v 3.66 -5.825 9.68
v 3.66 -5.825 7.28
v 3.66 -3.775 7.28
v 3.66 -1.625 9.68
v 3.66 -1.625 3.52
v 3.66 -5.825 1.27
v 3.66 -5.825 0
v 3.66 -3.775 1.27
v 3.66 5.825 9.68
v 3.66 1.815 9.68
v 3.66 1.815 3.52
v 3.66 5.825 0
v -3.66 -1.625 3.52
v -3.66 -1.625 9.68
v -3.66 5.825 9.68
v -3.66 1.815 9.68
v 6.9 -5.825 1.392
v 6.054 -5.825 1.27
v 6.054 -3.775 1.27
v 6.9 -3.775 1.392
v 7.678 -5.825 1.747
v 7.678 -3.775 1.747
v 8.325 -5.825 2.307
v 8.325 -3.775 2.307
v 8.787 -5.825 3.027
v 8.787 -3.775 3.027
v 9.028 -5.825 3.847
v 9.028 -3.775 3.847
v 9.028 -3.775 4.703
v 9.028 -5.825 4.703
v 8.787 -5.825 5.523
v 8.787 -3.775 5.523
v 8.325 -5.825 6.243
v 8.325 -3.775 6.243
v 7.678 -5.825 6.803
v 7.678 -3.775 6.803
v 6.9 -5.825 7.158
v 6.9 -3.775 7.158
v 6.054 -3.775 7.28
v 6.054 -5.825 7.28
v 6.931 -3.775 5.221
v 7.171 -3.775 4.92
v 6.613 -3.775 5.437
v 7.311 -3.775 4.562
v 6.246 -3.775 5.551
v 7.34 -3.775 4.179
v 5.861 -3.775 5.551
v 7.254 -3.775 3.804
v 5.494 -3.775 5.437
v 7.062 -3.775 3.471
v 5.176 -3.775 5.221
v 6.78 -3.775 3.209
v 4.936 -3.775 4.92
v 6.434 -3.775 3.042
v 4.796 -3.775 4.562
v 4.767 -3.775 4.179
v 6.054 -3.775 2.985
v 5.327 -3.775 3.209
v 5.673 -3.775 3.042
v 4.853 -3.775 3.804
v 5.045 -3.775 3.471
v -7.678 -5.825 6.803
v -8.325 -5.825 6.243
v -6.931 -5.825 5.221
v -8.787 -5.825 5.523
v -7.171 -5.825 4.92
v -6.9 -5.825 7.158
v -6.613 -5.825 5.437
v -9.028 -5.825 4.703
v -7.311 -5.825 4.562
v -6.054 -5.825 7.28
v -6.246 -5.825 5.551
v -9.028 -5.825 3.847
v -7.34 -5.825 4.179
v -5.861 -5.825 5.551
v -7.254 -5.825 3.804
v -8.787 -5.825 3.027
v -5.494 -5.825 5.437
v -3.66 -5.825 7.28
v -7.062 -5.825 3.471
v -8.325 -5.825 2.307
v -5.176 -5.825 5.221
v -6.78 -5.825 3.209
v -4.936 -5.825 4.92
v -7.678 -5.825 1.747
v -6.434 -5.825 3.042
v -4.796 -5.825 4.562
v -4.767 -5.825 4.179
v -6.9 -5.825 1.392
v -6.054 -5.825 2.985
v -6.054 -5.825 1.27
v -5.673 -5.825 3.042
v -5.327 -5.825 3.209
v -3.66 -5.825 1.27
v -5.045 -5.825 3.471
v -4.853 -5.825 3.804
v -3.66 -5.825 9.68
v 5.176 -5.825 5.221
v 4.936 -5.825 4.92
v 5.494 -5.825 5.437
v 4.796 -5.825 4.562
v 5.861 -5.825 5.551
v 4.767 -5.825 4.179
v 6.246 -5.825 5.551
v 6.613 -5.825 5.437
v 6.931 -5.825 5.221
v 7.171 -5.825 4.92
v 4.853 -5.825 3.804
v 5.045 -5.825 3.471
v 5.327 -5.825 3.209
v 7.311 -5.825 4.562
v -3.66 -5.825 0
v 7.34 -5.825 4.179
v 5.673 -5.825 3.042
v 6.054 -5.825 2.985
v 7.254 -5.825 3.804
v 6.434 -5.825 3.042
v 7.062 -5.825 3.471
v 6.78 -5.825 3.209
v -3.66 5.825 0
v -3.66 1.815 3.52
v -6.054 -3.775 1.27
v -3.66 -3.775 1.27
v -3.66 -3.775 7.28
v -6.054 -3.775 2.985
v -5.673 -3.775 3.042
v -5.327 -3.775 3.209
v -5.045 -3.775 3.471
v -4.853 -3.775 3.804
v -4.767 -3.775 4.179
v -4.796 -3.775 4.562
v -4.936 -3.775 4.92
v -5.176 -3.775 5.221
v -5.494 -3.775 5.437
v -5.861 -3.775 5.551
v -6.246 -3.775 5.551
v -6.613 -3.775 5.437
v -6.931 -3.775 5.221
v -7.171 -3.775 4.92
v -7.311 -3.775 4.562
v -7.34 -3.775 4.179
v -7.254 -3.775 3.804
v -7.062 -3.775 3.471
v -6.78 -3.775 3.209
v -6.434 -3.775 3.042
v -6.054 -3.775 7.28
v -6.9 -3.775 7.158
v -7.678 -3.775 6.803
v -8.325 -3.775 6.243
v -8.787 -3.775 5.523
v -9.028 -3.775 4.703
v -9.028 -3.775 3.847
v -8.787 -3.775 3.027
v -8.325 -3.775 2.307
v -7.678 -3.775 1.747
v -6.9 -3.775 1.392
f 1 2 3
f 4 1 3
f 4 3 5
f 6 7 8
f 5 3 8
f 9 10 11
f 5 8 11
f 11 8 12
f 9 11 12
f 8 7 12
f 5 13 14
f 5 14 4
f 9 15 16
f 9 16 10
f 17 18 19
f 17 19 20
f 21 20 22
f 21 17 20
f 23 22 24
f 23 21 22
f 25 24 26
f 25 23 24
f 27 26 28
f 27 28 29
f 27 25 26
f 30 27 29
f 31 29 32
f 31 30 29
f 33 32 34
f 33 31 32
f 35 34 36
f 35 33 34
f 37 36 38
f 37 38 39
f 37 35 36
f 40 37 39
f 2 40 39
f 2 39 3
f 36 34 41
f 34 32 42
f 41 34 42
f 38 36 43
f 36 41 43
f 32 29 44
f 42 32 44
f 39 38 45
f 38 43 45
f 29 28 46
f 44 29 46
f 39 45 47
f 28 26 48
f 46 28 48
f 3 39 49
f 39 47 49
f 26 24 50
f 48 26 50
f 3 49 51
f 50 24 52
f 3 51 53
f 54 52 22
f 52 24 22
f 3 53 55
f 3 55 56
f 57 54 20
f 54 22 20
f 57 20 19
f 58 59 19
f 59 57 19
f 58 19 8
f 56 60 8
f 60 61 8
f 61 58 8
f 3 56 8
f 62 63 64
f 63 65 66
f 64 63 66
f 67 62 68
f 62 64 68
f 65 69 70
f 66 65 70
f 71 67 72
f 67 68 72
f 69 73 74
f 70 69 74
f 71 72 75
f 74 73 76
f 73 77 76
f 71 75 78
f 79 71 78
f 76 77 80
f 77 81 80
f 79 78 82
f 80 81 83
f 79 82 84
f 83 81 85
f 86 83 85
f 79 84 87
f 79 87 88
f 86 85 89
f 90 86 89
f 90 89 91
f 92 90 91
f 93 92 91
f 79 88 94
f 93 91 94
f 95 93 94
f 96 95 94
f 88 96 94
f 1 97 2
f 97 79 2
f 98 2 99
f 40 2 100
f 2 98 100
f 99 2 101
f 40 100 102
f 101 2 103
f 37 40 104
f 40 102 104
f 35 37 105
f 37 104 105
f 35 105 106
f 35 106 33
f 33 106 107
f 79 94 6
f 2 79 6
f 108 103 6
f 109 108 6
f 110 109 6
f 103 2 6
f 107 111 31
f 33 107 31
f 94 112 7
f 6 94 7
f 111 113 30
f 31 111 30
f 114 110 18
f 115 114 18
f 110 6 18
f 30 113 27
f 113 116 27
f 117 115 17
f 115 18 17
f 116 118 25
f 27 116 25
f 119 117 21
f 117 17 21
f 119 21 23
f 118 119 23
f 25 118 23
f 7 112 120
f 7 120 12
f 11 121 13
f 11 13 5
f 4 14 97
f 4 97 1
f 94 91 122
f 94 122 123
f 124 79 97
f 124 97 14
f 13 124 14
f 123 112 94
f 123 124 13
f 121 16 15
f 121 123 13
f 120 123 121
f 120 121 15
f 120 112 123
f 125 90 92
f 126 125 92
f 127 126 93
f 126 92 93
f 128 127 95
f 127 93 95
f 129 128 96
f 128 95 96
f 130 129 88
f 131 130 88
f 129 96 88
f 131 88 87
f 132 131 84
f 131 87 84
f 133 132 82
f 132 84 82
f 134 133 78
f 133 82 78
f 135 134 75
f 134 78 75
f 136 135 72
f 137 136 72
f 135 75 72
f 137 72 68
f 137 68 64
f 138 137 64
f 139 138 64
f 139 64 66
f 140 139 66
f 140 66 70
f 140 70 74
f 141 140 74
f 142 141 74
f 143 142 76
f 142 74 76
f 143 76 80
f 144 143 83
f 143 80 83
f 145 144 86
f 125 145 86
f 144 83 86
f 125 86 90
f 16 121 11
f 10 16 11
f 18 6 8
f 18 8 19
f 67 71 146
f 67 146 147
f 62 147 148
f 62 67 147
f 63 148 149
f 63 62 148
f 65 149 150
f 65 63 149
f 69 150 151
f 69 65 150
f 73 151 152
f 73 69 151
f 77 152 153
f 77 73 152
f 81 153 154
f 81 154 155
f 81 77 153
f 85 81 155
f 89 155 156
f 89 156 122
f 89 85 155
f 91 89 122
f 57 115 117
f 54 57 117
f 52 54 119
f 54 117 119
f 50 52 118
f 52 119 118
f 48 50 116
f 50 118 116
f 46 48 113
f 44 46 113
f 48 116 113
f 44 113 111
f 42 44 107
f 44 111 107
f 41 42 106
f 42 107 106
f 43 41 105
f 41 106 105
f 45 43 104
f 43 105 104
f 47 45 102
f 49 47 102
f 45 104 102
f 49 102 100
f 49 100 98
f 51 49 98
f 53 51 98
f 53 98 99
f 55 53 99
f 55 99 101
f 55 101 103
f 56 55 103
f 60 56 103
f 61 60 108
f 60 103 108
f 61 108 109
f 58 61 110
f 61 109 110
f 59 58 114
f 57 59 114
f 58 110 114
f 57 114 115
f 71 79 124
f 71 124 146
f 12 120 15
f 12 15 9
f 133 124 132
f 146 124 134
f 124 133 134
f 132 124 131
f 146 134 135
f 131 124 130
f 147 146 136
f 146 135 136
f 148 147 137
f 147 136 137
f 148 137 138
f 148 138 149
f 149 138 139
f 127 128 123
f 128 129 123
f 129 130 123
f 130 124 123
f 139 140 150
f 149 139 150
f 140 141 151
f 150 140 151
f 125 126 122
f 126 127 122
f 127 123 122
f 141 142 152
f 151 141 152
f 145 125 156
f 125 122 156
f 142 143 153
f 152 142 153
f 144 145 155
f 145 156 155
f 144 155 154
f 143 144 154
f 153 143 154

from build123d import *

# Parameters (mm, degrees)
CROQUIS1_W              = 7.32
CROQUIS1_H              = 11.65
SALIENTE_EXTRUIR1_DEPTH = 3.52
CROQUIS2_W              = 7.32
CROQUIS2_H              = 4.2
CROQUIS2_H_2            = 4.01
SALIENTE_EXTRUIR2_DEPTH = 6.16
CROQUIS3_R              = 1.29
SALIENTE_EXTRUIR3_DEPTH = 2.05


with BuildPart() as part:
    # Croquis1 → Saliente-Extruir1 (new body)
    with BuildSketch(Plane.XY):
        Rectangle(CROQUIS1_W, CROQUIS1_H)
    extrude(amount=SALIENTE_EXTRUIR1_DEPTH)

    # Croquis2 → Saliente-Extruir2 (add)
    with BuildSketch(Plane.XY.offset(3.52)):
        with Locations((0, -3.725)):
            Rectangle(CROQUIS2_W, CROQUIS2_H)
        with Locations((0, 3.82)):
            Rectangle(CROQUIS2_W, CROQUIS2_H_2)
    extrude(amount=SALIENTE_EXTRUIR2_DEPTH)

    # Croquis3 → Saliente-Extruir3 (add)
    # profile 1 of 2: a face of its own
    with BuildSketch(Plane(origin=(0, -5.825, 0), x_dir=(-1, 0, 0), z_dir=(0, -1, 0))):
        with BuildLine():
            ThreePointArc((-6.0536211, -1.27), (-9.0586211, -4.275), (-6.0536211, -7.28))
            Line((-6.0536211, -7.28), (-3.66, -7.28))
            Line((-3.66, -7.28), (-3.66, -1.27))
            Line((-3.66, -1.27), (-6.0536211, -1.27))
        make_face()
        with Locations(Location((-6.0536211, -4.275, 0), (0, 0, 90))):
            Circle(CROQUIS3_R, mode=Mode.SUBTRACT)
    # profile 2 of 2: a face of its own
    with BuildSketch(Plane(origin=(0, -5.825, 0), x_dir=(-1, 0, 0), z_dir=(0, -1, 0))):
        with BuildLine():
            ThreePointArc((6.0536211, -7.28), (9.0586211, -4.275), (6.0536211, -1.27))
            Line((6.0536211, -1.27), (3.66, -1.27))
            Line((3.66, -1.27), (3.66, -7.28))
            Line((3.66, -7.28), (6.0536211, -7.28))
        make_face()
        with Locations(Location((6.0536211, -4.275, 0), (0, 0, 90))):
            Circle(CROQUIS3_R, mode=Mode.SUBTRACT)
    extrude(amount=-SALIENTE_EXTRUIR3_DEPTH)


solid = part.part
